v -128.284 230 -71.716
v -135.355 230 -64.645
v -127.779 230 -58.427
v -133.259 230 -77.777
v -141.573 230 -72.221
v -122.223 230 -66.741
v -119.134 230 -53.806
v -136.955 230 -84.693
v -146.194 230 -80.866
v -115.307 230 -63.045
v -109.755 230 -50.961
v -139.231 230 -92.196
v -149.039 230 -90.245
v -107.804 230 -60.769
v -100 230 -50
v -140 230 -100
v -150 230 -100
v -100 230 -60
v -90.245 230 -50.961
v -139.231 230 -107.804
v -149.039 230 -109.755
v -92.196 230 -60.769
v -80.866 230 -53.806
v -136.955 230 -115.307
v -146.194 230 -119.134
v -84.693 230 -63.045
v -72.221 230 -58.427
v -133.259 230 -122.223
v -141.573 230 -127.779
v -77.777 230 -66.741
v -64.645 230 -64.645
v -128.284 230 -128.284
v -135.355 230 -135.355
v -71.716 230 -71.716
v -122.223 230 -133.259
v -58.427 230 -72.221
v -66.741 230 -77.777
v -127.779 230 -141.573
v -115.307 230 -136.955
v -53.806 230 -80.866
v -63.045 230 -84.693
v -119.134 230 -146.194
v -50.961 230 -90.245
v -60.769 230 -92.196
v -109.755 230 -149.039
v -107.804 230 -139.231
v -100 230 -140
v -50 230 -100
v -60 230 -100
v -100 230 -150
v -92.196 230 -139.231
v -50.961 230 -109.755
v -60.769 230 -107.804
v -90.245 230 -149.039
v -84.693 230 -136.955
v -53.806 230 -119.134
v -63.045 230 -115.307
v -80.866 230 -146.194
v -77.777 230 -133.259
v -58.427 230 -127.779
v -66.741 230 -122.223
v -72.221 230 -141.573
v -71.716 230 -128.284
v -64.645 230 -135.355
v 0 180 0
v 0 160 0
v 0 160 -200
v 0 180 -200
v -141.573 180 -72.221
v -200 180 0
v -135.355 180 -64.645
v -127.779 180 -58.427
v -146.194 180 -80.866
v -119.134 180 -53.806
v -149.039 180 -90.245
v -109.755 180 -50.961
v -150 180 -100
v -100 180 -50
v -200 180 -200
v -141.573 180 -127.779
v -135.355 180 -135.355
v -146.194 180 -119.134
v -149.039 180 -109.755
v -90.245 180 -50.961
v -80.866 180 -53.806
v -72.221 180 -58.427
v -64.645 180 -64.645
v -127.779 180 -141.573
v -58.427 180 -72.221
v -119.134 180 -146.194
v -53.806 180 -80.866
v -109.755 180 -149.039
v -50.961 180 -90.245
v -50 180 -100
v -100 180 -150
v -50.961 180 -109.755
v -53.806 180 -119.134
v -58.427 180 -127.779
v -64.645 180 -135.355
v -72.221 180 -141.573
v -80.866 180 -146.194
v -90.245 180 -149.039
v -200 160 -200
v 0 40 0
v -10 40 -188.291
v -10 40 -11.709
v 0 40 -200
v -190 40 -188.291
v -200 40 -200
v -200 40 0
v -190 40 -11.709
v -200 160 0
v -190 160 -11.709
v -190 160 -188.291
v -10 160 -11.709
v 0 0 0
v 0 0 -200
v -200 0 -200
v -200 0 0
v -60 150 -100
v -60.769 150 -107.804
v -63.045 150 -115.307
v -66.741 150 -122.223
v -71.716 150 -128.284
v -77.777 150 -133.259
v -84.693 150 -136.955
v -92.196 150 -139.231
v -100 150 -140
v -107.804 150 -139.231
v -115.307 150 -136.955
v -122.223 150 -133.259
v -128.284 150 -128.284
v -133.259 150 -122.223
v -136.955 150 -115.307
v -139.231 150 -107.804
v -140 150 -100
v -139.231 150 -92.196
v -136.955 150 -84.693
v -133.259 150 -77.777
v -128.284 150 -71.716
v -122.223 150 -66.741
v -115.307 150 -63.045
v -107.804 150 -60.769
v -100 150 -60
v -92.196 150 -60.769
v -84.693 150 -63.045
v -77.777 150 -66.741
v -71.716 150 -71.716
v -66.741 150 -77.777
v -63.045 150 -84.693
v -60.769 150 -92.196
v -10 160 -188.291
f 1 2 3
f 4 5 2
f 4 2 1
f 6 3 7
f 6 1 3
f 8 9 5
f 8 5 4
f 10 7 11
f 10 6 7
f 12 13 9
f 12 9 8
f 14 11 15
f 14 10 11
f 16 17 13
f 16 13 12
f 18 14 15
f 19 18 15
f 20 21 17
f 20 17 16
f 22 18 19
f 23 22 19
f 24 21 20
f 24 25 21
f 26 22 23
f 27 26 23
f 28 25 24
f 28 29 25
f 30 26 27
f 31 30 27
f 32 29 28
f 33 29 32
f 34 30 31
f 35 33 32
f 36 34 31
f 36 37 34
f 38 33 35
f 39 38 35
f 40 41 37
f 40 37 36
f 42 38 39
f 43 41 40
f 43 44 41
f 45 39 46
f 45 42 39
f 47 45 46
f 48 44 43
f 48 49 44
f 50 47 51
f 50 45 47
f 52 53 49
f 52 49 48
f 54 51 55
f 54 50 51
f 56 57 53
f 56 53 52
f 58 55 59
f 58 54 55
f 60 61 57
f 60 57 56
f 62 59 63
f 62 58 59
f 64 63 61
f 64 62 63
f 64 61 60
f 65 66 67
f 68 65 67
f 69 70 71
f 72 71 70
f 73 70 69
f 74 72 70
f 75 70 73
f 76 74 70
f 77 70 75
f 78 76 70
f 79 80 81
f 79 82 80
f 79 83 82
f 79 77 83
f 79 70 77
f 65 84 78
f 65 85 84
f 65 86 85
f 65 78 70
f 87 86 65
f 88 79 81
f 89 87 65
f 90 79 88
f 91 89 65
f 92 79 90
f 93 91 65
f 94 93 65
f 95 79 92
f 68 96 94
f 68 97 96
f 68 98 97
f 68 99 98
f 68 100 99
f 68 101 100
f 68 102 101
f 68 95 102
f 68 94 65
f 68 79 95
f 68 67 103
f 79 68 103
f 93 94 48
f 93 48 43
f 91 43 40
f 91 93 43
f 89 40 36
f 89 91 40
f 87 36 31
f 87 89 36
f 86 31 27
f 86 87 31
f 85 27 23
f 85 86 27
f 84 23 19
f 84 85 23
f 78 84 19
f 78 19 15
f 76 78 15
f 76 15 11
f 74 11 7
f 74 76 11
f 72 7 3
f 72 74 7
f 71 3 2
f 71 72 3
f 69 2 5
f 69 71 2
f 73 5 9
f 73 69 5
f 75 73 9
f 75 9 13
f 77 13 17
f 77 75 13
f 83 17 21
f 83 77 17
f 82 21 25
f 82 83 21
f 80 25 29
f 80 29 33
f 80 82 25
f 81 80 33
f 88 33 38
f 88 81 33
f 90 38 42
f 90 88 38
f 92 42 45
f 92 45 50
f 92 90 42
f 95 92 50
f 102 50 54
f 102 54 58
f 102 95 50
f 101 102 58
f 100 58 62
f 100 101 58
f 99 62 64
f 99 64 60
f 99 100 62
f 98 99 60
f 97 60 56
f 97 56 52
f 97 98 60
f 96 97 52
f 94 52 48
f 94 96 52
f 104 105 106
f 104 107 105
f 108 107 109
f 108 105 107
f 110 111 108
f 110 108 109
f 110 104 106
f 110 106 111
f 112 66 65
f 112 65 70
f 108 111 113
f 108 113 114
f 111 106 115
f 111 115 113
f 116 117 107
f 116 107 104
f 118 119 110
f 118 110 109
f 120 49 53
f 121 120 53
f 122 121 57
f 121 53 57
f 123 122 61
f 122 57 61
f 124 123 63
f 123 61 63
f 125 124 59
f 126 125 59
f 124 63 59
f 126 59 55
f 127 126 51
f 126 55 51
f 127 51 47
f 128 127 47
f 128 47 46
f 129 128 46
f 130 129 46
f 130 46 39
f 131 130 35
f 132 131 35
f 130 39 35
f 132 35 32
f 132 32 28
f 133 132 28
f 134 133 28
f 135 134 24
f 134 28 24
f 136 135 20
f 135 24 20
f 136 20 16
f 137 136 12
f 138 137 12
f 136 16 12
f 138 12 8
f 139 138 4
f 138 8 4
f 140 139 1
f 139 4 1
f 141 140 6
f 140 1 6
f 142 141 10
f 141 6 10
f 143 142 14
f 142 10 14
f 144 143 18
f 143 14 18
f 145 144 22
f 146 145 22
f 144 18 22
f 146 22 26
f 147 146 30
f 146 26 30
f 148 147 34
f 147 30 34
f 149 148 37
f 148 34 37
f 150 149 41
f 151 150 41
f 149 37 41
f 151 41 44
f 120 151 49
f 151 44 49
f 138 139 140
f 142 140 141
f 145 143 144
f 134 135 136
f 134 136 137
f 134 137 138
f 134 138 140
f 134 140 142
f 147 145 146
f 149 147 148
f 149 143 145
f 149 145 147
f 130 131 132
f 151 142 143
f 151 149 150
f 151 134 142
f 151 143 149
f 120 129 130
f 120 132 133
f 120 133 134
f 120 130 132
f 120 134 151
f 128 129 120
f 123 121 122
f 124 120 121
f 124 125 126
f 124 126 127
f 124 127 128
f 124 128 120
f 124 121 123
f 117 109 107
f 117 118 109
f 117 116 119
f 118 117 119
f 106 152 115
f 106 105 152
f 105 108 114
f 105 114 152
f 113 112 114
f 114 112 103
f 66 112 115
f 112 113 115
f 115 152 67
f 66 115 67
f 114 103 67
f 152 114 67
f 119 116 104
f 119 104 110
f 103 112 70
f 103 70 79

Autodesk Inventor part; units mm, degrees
ref_plane "YZ Plane" through (0, 0, 0) normal (1, 0, 0) x (0, 1, 0)
ref_plane "XZ Plane" through (0, 0, 0) normal (0, 1, 0) x (-1, 0, 0)
ref_plane "XY Plane" through (0, 0, 0) normal (0, 0, 1) x (1, 0, 0)
sketch "Sketch1" plane through (0, 0, 0) normal (0, 1, 0) x (-1, 0, 0)
  line L0 (0, 0) -> (200, 0)
  line L1 (200, 0) -> (200, -200)
  line L2 (200, -200) -> (0, -200)
  line L3 (0, -200) -> (0, 0)
  dimension "d0" = 200
  dimension "d1" = 200
extrude "Extrusion1" add sketch "Sketch1" along normal blind 40
sketch "Sketch2" plane through (0, 40, 0) normal (0, 1, 0) x (1, 0, 0)
  line L0 (0, 200) -> (-200, 200) projected
  line L1 (-200, 200) -> (-200, 0) projected
  line L2 (-200, 0) -> (0, 0) projected
  line L3 (0, 0) -> (0, 200) projected
  line L4 (-10, 11.7093) -> (-190, 11.7093)
  line L5 (-190, 11.7093) -> (-190, 188.2907)
  line L6 (-190, 188.2907) -> (-10, 188.2907)
  line L7 (-10, 188.2907) -> (-10, 11.7093)
  line L8 (-10, 11.7093) -> (-190, 188.2907) construction
  line L9 (-190, 11.7093) -> (-10, 188.2907) construction
  point P0 (-100, 100)
  dimension "d4" = 180
extrude "Extrusion2" add sketch "Sketch2" along normal blind 120 contours L4 L5 L6 L7
sketch "Sketch3" plane through (0, 160, 0) normal (0, 1, 0) x (1, 0, 0)
  line L0 (-10, 188.2907) -> (-190, 188.2907) projected
  line L1 (-190, 188.2907) -> (-190, 11.7093) projected
  line L2 (-190, 11.7093) -> (-10, 11.7093) projected
  line L3 (-10, 11.7093) -> (-10, 188.2907) projected
  line L4 (0, 0) -> (0, 200) projected
  line L5 (0, 200) -> (-200, 200) projected
  line L6 (0, 0) -> (-200, 0)
  line L7 (-200, 0) -> (-200, 200)
  line L8 (-200, 200) -> (0, 200)
  line L9 (0, 200) -> (0, 0)
extrude "Extrusion3" add sketch "Sketch3" along normal blind 20 contours L3 L2 L1 L0 | L6 L7 L5 L4
sketch "Sketch4" plane through (0, 180, 0) normal (0, 1, 0) x (1, 0, 0)
  line L0 (-200, 200) -> (-200, 0) projected
  line L1 (-200, 200) -> (0, 0)
  line L2 (0, 200) -> (-200, 200) projected
  line L3 (-200, 0) -> (0, 200)
  circle A0 centre (-100, 100) radius 50
  dimension "d9" = 100
extrude "Extrusion4" add sketch "Sketch4" along normal blind 50 contours A0 L3 L1 | L1 L3 A0 | L3 L1 A0 | L3 A0 L1
sketch "Sketch5" plane through (-100, 230, -100) normal (0, 1, 0) x (1, 0, 0)
  circle A0 centre (0, 0) radius 40
  point P0 (100, -100)
  dimension "d12" = 80
extrude "Extrusion5" cut sketch "Sketch5" against normal blind 80
properties part number "Camara"
